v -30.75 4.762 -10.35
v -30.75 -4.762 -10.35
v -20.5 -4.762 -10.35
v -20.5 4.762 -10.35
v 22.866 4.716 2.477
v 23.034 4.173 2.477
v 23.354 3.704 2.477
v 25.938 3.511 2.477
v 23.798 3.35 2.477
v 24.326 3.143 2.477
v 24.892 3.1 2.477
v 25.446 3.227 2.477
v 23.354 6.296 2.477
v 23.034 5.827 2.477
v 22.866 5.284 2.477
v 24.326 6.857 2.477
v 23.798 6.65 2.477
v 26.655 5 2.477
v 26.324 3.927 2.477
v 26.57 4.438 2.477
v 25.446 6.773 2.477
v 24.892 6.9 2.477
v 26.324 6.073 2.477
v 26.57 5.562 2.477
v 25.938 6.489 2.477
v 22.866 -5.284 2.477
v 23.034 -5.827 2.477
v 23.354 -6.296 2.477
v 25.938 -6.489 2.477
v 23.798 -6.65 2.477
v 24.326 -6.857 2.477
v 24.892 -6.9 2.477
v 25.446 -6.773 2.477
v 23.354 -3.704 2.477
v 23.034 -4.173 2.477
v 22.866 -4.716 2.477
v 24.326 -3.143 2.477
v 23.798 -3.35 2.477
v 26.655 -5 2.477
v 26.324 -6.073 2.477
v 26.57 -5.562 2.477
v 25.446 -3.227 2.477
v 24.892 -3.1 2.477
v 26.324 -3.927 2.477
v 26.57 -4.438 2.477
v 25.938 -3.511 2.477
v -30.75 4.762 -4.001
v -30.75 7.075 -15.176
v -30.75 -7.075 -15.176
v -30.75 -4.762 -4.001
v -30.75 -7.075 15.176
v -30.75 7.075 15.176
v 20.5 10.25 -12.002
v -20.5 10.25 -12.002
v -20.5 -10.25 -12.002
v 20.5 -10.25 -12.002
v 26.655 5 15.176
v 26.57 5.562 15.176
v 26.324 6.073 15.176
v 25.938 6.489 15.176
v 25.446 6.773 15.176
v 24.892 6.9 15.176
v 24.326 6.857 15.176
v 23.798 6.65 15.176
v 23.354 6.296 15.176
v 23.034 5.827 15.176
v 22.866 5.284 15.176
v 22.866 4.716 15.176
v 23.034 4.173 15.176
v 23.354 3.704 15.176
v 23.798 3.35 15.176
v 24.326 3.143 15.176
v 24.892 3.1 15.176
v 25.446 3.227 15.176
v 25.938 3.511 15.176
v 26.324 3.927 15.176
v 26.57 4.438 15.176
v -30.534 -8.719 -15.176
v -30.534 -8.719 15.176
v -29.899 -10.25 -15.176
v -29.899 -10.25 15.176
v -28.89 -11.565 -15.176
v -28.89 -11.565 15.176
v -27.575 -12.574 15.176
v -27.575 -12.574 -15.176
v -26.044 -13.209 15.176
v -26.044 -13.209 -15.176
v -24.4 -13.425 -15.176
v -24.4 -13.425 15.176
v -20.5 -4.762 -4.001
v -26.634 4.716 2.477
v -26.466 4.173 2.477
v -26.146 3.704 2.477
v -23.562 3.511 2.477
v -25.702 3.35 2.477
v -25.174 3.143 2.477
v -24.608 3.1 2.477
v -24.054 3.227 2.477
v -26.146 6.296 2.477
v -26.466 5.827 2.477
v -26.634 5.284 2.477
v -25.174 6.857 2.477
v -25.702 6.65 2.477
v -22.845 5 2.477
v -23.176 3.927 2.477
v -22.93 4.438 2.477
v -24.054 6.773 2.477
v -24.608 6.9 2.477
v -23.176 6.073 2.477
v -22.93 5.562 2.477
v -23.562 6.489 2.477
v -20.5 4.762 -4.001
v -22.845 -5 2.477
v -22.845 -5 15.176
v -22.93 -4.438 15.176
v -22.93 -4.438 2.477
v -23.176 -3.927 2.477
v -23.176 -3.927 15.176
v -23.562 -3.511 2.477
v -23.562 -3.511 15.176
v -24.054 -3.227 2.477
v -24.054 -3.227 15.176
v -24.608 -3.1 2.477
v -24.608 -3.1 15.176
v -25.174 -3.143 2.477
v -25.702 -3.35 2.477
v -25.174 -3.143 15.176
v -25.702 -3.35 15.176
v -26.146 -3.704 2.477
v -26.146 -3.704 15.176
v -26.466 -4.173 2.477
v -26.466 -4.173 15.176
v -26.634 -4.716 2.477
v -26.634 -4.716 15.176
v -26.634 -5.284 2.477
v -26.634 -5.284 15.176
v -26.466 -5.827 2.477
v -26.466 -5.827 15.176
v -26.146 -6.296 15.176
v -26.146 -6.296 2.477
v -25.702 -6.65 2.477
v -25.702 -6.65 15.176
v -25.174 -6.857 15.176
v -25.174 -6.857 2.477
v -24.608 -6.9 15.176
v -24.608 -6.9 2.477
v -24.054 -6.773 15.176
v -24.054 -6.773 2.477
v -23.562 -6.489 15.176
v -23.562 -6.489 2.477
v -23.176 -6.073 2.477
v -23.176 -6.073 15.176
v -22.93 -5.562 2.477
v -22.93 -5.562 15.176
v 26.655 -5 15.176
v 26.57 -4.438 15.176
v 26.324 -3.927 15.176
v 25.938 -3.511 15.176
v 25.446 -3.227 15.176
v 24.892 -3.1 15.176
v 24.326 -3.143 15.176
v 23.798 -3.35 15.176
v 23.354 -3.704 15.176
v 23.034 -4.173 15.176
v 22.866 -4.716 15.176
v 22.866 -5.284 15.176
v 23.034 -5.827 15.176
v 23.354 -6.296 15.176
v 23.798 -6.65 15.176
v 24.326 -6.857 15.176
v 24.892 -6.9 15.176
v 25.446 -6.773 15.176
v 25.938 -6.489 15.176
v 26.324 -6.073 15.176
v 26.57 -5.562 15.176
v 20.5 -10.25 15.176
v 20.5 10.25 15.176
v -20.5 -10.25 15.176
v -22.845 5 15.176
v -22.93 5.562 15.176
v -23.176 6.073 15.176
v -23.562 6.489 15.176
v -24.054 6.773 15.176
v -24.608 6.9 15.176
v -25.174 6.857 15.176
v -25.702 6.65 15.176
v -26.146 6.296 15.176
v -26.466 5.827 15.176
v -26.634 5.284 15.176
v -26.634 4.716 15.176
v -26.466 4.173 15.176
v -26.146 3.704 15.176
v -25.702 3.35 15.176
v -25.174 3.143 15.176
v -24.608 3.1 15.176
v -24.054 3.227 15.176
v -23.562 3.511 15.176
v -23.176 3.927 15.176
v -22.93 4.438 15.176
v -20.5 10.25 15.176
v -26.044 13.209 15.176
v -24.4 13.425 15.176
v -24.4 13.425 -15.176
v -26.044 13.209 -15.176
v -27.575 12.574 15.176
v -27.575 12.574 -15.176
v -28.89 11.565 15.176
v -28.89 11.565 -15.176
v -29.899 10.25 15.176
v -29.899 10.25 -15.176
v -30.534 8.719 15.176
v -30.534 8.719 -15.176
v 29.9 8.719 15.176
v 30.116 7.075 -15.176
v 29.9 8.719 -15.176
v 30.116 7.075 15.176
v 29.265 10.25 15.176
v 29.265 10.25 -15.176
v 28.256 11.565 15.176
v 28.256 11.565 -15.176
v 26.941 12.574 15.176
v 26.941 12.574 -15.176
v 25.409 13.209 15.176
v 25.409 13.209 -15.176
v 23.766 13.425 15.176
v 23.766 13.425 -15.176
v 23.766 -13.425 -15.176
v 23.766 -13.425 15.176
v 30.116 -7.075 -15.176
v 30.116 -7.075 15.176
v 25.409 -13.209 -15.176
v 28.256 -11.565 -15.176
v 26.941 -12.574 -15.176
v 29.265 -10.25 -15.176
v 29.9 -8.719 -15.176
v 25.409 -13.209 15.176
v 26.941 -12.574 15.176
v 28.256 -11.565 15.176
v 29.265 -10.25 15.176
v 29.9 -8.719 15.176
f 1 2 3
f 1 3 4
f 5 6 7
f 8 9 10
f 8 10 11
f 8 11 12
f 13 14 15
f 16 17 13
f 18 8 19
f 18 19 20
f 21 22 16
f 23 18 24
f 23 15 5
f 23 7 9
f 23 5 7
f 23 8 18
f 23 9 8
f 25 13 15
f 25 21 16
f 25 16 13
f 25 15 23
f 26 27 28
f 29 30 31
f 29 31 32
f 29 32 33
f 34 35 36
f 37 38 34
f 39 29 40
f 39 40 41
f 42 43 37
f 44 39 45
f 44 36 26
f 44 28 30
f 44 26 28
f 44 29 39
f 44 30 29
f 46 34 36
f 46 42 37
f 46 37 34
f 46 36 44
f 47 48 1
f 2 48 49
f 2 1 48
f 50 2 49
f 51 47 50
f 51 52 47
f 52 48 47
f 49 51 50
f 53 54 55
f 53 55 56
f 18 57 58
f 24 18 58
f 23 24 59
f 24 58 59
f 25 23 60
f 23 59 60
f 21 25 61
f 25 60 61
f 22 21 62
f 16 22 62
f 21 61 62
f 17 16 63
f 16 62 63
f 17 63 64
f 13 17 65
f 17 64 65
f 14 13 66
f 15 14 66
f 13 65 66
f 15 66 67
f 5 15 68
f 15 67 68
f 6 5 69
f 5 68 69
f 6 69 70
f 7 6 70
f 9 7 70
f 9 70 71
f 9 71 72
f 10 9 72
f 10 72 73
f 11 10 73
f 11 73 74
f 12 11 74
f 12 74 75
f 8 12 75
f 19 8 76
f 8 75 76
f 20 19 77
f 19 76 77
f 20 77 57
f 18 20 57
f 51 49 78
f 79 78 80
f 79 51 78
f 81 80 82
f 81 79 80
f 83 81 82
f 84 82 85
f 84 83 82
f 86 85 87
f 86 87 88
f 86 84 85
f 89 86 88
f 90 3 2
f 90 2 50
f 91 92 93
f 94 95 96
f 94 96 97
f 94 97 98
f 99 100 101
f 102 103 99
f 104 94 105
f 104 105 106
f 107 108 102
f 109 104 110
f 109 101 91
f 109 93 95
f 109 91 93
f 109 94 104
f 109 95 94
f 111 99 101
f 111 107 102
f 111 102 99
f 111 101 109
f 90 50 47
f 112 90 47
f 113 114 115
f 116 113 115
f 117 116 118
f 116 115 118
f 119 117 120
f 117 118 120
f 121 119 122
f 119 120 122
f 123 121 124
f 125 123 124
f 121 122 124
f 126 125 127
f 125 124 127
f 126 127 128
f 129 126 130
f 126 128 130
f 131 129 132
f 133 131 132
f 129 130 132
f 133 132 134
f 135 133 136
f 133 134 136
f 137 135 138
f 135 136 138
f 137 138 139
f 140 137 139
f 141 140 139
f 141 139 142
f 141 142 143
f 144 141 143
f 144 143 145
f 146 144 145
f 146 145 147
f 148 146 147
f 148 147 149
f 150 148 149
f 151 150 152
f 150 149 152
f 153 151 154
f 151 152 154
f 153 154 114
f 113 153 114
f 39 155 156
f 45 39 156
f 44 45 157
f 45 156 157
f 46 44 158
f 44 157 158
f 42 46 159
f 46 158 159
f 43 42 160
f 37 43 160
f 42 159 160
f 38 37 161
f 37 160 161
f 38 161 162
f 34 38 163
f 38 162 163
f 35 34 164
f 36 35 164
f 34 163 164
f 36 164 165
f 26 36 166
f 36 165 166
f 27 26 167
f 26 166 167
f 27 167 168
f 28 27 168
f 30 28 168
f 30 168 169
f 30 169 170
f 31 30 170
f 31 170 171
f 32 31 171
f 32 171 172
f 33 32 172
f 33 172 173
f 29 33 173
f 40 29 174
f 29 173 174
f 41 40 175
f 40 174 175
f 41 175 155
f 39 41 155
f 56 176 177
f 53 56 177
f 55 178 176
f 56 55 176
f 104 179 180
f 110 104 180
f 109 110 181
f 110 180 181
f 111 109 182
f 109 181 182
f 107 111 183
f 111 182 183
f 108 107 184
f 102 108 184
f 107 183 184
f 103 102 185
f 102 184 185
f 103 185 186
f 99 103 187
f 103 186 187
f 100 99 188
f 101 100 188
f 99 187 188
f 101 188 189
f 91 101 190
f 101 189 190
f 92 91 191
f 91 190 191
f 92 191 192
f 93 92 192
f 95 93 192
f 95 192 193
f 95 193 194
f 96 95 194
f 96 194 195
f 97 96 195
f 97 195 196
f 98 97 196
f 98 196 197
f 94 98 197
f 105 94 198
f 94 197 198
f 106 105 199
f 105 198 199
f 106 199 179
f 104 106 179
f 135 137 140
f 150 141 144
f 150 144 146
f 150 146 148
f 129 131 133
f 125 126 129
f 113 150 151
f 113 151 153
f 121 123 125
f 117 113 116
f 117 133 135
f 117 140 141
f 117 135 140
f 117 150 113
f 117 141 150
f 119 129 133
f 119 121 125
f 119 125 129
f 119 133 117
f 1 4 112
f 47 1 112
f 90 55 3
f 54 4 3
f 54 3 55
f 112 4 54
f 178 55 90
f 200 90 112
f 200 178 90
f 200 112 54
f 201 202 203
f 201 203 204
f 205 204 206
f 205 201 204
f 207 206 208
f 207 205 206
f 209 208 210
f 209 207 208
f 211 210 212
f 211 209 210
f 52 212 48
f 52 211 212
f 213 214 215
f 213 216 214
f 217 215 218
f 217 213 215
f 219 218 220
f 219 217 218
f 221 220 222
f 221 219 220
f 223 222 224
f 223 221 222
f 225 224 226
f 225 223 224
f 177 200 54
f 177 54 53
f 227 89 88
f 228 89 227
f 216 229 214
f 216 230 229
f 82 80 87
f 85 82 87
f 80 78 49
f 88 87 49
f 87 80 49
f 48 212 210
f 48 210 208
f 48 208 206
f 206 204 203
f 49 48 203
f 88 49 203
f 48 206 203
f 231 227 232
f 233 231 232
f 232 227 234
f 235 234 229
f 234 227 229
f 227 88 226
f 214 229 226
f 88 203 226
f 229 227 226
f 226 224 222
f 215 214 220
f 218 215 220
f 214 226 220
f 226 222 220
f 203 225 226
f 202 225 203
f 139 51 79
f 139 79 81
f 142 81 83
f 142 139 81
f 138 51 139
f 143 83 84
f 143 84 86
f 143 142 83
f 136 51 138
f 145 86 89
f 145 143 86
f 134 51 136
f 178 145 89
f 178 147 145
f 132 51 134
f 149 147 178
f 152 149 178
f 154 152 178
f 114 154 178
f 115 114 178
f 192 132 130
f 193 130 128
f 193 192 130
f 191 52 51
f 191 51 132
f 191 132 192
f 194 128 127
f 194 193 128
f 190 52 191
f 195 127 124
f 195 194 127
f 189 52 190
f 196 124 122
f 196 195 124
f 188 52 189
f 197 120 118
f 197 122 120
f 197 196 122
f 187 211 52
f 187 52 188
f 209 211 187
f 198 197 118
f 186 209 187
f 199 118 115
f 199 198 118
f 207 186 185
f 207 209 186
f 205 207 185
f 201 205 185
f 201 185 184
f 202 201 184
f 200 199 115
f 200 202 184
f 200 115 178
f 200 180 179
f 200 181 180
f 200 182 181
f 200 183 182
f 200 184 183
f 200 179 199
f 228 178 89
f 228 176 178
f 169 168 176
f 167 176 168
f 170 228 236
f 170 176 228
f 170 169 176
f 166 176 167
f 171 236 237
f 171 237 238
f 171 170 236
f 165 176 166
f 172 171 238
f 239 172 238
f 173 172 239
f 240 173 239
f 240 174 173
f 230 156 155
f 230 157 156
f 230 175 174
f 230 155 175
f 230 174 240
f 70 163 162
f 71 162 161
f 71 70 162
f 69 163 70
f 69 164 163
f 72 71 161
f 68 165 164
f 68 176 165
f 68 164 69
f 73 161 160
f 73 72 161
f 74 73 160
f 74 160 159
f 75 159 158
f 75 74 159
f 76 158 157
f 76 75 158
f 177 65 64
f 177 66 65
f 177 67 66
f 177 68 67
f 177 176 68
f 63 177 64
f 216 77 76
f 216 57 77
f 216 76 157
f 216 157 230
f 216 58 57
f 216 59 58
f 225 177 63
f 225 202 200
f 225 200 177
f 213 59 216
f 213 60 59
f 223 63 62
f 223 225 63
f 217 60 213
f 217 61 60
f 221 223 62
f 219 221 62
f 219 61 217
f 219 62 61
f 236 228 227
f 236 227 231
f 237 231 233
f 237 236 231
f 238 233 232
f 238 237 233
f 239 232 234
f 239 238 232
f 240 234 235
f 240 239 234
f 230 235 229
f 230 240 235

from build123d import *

# Parameters (mm, degrees)
BOSS_EXTRUDE1_DEPTH = 15.1765
SKETCH3_W           = 41
SKETCH3_H           = 20.5
CUT_EXTRUDE1_DEPTH  = 27.178
SKETCH4_R           = 1.905
CUT_EXTRUDE2_DEPTH  = 12.7
SKETCH5_W           = 6.35
SKETCH5_H           = 9.525
CUT_EXTRUDE3_DEPTH  = 10.25


with BuildPart() as part:
    # Sketch2 → Boss-Extrude1 (new, symmetric)
    with BuildSketch(Plane.XY):
        with BuildLine():
            Line((23.765883374, 13.425), (-24.4, 13.425))
            ThreePointArc((-24.4, 13.425), (-28.890128061, 11.565128061), (-30.75, 7.075))
            Line((-30.75, 7.075), (-30.75, -7.075))
            ThreePointArc((-30.75, -7.075), (-28.890128061, -11.565128061), (-24.4, -13.425))
            Line((-24.4, -13.425), (23.765883374, -13.425))
            ThreePointArc((23.765883374, -13.425), (28.256011435, -11.565128061), (30.115883374, -7.075))
            Line((30.115883374, -7.075), (30.115883374, 7.075))
            ThreePointArc((30.115883374, 7.075), (28.256011435, 11.565128061), (23.765883374, 13.425))
        make_face()
    extrude(amount=BOSS_EXTRUDE1_DEPTH, both=True)

    # Sketch3 → Cut-Extrude1 (cut)
    with BuildSketch(Plane.XY.offset(15.1765)):
        Rectangle(SKETCH3_W, SKETCH3_H)
    extrude(amount=-CUT_EXTRUDE1_DEPTH, mode=Mode.SUBTRACT)

    # Sketch4 → Cut-Extrude2 (cut)
    with BuildSketch(Plane.XY.offset(15.1765)):
        with Locations((-24.75, 5)):
            Circle(SKETCH4_R)
        with Locations((-24.75, -5)):
            Circle(SKETCH4_R)
        with Locations((24.75, -5)):
            Circle(SKETCH4_R)
        with Locations((24.75, 5)):
            Circle(SKETCH4_R)
    extrude(amount=-CUT_EXTRUDE2_DEPTH, mode=Mode.SUBTRACT)

    # Sketch5 → Cut-Extrude3 (cut)
    with BuildSketch(Plane.ZY.offset(30.75)):
        with Locations((-7.1755, 0)):
            Rectangle(SKETCH5_W, SKETCH5_H)
    extrude(amount=-CUT_EXTRUDE3_DEPTH, mode=Mode.SUBTRACT)


solid = part.part
